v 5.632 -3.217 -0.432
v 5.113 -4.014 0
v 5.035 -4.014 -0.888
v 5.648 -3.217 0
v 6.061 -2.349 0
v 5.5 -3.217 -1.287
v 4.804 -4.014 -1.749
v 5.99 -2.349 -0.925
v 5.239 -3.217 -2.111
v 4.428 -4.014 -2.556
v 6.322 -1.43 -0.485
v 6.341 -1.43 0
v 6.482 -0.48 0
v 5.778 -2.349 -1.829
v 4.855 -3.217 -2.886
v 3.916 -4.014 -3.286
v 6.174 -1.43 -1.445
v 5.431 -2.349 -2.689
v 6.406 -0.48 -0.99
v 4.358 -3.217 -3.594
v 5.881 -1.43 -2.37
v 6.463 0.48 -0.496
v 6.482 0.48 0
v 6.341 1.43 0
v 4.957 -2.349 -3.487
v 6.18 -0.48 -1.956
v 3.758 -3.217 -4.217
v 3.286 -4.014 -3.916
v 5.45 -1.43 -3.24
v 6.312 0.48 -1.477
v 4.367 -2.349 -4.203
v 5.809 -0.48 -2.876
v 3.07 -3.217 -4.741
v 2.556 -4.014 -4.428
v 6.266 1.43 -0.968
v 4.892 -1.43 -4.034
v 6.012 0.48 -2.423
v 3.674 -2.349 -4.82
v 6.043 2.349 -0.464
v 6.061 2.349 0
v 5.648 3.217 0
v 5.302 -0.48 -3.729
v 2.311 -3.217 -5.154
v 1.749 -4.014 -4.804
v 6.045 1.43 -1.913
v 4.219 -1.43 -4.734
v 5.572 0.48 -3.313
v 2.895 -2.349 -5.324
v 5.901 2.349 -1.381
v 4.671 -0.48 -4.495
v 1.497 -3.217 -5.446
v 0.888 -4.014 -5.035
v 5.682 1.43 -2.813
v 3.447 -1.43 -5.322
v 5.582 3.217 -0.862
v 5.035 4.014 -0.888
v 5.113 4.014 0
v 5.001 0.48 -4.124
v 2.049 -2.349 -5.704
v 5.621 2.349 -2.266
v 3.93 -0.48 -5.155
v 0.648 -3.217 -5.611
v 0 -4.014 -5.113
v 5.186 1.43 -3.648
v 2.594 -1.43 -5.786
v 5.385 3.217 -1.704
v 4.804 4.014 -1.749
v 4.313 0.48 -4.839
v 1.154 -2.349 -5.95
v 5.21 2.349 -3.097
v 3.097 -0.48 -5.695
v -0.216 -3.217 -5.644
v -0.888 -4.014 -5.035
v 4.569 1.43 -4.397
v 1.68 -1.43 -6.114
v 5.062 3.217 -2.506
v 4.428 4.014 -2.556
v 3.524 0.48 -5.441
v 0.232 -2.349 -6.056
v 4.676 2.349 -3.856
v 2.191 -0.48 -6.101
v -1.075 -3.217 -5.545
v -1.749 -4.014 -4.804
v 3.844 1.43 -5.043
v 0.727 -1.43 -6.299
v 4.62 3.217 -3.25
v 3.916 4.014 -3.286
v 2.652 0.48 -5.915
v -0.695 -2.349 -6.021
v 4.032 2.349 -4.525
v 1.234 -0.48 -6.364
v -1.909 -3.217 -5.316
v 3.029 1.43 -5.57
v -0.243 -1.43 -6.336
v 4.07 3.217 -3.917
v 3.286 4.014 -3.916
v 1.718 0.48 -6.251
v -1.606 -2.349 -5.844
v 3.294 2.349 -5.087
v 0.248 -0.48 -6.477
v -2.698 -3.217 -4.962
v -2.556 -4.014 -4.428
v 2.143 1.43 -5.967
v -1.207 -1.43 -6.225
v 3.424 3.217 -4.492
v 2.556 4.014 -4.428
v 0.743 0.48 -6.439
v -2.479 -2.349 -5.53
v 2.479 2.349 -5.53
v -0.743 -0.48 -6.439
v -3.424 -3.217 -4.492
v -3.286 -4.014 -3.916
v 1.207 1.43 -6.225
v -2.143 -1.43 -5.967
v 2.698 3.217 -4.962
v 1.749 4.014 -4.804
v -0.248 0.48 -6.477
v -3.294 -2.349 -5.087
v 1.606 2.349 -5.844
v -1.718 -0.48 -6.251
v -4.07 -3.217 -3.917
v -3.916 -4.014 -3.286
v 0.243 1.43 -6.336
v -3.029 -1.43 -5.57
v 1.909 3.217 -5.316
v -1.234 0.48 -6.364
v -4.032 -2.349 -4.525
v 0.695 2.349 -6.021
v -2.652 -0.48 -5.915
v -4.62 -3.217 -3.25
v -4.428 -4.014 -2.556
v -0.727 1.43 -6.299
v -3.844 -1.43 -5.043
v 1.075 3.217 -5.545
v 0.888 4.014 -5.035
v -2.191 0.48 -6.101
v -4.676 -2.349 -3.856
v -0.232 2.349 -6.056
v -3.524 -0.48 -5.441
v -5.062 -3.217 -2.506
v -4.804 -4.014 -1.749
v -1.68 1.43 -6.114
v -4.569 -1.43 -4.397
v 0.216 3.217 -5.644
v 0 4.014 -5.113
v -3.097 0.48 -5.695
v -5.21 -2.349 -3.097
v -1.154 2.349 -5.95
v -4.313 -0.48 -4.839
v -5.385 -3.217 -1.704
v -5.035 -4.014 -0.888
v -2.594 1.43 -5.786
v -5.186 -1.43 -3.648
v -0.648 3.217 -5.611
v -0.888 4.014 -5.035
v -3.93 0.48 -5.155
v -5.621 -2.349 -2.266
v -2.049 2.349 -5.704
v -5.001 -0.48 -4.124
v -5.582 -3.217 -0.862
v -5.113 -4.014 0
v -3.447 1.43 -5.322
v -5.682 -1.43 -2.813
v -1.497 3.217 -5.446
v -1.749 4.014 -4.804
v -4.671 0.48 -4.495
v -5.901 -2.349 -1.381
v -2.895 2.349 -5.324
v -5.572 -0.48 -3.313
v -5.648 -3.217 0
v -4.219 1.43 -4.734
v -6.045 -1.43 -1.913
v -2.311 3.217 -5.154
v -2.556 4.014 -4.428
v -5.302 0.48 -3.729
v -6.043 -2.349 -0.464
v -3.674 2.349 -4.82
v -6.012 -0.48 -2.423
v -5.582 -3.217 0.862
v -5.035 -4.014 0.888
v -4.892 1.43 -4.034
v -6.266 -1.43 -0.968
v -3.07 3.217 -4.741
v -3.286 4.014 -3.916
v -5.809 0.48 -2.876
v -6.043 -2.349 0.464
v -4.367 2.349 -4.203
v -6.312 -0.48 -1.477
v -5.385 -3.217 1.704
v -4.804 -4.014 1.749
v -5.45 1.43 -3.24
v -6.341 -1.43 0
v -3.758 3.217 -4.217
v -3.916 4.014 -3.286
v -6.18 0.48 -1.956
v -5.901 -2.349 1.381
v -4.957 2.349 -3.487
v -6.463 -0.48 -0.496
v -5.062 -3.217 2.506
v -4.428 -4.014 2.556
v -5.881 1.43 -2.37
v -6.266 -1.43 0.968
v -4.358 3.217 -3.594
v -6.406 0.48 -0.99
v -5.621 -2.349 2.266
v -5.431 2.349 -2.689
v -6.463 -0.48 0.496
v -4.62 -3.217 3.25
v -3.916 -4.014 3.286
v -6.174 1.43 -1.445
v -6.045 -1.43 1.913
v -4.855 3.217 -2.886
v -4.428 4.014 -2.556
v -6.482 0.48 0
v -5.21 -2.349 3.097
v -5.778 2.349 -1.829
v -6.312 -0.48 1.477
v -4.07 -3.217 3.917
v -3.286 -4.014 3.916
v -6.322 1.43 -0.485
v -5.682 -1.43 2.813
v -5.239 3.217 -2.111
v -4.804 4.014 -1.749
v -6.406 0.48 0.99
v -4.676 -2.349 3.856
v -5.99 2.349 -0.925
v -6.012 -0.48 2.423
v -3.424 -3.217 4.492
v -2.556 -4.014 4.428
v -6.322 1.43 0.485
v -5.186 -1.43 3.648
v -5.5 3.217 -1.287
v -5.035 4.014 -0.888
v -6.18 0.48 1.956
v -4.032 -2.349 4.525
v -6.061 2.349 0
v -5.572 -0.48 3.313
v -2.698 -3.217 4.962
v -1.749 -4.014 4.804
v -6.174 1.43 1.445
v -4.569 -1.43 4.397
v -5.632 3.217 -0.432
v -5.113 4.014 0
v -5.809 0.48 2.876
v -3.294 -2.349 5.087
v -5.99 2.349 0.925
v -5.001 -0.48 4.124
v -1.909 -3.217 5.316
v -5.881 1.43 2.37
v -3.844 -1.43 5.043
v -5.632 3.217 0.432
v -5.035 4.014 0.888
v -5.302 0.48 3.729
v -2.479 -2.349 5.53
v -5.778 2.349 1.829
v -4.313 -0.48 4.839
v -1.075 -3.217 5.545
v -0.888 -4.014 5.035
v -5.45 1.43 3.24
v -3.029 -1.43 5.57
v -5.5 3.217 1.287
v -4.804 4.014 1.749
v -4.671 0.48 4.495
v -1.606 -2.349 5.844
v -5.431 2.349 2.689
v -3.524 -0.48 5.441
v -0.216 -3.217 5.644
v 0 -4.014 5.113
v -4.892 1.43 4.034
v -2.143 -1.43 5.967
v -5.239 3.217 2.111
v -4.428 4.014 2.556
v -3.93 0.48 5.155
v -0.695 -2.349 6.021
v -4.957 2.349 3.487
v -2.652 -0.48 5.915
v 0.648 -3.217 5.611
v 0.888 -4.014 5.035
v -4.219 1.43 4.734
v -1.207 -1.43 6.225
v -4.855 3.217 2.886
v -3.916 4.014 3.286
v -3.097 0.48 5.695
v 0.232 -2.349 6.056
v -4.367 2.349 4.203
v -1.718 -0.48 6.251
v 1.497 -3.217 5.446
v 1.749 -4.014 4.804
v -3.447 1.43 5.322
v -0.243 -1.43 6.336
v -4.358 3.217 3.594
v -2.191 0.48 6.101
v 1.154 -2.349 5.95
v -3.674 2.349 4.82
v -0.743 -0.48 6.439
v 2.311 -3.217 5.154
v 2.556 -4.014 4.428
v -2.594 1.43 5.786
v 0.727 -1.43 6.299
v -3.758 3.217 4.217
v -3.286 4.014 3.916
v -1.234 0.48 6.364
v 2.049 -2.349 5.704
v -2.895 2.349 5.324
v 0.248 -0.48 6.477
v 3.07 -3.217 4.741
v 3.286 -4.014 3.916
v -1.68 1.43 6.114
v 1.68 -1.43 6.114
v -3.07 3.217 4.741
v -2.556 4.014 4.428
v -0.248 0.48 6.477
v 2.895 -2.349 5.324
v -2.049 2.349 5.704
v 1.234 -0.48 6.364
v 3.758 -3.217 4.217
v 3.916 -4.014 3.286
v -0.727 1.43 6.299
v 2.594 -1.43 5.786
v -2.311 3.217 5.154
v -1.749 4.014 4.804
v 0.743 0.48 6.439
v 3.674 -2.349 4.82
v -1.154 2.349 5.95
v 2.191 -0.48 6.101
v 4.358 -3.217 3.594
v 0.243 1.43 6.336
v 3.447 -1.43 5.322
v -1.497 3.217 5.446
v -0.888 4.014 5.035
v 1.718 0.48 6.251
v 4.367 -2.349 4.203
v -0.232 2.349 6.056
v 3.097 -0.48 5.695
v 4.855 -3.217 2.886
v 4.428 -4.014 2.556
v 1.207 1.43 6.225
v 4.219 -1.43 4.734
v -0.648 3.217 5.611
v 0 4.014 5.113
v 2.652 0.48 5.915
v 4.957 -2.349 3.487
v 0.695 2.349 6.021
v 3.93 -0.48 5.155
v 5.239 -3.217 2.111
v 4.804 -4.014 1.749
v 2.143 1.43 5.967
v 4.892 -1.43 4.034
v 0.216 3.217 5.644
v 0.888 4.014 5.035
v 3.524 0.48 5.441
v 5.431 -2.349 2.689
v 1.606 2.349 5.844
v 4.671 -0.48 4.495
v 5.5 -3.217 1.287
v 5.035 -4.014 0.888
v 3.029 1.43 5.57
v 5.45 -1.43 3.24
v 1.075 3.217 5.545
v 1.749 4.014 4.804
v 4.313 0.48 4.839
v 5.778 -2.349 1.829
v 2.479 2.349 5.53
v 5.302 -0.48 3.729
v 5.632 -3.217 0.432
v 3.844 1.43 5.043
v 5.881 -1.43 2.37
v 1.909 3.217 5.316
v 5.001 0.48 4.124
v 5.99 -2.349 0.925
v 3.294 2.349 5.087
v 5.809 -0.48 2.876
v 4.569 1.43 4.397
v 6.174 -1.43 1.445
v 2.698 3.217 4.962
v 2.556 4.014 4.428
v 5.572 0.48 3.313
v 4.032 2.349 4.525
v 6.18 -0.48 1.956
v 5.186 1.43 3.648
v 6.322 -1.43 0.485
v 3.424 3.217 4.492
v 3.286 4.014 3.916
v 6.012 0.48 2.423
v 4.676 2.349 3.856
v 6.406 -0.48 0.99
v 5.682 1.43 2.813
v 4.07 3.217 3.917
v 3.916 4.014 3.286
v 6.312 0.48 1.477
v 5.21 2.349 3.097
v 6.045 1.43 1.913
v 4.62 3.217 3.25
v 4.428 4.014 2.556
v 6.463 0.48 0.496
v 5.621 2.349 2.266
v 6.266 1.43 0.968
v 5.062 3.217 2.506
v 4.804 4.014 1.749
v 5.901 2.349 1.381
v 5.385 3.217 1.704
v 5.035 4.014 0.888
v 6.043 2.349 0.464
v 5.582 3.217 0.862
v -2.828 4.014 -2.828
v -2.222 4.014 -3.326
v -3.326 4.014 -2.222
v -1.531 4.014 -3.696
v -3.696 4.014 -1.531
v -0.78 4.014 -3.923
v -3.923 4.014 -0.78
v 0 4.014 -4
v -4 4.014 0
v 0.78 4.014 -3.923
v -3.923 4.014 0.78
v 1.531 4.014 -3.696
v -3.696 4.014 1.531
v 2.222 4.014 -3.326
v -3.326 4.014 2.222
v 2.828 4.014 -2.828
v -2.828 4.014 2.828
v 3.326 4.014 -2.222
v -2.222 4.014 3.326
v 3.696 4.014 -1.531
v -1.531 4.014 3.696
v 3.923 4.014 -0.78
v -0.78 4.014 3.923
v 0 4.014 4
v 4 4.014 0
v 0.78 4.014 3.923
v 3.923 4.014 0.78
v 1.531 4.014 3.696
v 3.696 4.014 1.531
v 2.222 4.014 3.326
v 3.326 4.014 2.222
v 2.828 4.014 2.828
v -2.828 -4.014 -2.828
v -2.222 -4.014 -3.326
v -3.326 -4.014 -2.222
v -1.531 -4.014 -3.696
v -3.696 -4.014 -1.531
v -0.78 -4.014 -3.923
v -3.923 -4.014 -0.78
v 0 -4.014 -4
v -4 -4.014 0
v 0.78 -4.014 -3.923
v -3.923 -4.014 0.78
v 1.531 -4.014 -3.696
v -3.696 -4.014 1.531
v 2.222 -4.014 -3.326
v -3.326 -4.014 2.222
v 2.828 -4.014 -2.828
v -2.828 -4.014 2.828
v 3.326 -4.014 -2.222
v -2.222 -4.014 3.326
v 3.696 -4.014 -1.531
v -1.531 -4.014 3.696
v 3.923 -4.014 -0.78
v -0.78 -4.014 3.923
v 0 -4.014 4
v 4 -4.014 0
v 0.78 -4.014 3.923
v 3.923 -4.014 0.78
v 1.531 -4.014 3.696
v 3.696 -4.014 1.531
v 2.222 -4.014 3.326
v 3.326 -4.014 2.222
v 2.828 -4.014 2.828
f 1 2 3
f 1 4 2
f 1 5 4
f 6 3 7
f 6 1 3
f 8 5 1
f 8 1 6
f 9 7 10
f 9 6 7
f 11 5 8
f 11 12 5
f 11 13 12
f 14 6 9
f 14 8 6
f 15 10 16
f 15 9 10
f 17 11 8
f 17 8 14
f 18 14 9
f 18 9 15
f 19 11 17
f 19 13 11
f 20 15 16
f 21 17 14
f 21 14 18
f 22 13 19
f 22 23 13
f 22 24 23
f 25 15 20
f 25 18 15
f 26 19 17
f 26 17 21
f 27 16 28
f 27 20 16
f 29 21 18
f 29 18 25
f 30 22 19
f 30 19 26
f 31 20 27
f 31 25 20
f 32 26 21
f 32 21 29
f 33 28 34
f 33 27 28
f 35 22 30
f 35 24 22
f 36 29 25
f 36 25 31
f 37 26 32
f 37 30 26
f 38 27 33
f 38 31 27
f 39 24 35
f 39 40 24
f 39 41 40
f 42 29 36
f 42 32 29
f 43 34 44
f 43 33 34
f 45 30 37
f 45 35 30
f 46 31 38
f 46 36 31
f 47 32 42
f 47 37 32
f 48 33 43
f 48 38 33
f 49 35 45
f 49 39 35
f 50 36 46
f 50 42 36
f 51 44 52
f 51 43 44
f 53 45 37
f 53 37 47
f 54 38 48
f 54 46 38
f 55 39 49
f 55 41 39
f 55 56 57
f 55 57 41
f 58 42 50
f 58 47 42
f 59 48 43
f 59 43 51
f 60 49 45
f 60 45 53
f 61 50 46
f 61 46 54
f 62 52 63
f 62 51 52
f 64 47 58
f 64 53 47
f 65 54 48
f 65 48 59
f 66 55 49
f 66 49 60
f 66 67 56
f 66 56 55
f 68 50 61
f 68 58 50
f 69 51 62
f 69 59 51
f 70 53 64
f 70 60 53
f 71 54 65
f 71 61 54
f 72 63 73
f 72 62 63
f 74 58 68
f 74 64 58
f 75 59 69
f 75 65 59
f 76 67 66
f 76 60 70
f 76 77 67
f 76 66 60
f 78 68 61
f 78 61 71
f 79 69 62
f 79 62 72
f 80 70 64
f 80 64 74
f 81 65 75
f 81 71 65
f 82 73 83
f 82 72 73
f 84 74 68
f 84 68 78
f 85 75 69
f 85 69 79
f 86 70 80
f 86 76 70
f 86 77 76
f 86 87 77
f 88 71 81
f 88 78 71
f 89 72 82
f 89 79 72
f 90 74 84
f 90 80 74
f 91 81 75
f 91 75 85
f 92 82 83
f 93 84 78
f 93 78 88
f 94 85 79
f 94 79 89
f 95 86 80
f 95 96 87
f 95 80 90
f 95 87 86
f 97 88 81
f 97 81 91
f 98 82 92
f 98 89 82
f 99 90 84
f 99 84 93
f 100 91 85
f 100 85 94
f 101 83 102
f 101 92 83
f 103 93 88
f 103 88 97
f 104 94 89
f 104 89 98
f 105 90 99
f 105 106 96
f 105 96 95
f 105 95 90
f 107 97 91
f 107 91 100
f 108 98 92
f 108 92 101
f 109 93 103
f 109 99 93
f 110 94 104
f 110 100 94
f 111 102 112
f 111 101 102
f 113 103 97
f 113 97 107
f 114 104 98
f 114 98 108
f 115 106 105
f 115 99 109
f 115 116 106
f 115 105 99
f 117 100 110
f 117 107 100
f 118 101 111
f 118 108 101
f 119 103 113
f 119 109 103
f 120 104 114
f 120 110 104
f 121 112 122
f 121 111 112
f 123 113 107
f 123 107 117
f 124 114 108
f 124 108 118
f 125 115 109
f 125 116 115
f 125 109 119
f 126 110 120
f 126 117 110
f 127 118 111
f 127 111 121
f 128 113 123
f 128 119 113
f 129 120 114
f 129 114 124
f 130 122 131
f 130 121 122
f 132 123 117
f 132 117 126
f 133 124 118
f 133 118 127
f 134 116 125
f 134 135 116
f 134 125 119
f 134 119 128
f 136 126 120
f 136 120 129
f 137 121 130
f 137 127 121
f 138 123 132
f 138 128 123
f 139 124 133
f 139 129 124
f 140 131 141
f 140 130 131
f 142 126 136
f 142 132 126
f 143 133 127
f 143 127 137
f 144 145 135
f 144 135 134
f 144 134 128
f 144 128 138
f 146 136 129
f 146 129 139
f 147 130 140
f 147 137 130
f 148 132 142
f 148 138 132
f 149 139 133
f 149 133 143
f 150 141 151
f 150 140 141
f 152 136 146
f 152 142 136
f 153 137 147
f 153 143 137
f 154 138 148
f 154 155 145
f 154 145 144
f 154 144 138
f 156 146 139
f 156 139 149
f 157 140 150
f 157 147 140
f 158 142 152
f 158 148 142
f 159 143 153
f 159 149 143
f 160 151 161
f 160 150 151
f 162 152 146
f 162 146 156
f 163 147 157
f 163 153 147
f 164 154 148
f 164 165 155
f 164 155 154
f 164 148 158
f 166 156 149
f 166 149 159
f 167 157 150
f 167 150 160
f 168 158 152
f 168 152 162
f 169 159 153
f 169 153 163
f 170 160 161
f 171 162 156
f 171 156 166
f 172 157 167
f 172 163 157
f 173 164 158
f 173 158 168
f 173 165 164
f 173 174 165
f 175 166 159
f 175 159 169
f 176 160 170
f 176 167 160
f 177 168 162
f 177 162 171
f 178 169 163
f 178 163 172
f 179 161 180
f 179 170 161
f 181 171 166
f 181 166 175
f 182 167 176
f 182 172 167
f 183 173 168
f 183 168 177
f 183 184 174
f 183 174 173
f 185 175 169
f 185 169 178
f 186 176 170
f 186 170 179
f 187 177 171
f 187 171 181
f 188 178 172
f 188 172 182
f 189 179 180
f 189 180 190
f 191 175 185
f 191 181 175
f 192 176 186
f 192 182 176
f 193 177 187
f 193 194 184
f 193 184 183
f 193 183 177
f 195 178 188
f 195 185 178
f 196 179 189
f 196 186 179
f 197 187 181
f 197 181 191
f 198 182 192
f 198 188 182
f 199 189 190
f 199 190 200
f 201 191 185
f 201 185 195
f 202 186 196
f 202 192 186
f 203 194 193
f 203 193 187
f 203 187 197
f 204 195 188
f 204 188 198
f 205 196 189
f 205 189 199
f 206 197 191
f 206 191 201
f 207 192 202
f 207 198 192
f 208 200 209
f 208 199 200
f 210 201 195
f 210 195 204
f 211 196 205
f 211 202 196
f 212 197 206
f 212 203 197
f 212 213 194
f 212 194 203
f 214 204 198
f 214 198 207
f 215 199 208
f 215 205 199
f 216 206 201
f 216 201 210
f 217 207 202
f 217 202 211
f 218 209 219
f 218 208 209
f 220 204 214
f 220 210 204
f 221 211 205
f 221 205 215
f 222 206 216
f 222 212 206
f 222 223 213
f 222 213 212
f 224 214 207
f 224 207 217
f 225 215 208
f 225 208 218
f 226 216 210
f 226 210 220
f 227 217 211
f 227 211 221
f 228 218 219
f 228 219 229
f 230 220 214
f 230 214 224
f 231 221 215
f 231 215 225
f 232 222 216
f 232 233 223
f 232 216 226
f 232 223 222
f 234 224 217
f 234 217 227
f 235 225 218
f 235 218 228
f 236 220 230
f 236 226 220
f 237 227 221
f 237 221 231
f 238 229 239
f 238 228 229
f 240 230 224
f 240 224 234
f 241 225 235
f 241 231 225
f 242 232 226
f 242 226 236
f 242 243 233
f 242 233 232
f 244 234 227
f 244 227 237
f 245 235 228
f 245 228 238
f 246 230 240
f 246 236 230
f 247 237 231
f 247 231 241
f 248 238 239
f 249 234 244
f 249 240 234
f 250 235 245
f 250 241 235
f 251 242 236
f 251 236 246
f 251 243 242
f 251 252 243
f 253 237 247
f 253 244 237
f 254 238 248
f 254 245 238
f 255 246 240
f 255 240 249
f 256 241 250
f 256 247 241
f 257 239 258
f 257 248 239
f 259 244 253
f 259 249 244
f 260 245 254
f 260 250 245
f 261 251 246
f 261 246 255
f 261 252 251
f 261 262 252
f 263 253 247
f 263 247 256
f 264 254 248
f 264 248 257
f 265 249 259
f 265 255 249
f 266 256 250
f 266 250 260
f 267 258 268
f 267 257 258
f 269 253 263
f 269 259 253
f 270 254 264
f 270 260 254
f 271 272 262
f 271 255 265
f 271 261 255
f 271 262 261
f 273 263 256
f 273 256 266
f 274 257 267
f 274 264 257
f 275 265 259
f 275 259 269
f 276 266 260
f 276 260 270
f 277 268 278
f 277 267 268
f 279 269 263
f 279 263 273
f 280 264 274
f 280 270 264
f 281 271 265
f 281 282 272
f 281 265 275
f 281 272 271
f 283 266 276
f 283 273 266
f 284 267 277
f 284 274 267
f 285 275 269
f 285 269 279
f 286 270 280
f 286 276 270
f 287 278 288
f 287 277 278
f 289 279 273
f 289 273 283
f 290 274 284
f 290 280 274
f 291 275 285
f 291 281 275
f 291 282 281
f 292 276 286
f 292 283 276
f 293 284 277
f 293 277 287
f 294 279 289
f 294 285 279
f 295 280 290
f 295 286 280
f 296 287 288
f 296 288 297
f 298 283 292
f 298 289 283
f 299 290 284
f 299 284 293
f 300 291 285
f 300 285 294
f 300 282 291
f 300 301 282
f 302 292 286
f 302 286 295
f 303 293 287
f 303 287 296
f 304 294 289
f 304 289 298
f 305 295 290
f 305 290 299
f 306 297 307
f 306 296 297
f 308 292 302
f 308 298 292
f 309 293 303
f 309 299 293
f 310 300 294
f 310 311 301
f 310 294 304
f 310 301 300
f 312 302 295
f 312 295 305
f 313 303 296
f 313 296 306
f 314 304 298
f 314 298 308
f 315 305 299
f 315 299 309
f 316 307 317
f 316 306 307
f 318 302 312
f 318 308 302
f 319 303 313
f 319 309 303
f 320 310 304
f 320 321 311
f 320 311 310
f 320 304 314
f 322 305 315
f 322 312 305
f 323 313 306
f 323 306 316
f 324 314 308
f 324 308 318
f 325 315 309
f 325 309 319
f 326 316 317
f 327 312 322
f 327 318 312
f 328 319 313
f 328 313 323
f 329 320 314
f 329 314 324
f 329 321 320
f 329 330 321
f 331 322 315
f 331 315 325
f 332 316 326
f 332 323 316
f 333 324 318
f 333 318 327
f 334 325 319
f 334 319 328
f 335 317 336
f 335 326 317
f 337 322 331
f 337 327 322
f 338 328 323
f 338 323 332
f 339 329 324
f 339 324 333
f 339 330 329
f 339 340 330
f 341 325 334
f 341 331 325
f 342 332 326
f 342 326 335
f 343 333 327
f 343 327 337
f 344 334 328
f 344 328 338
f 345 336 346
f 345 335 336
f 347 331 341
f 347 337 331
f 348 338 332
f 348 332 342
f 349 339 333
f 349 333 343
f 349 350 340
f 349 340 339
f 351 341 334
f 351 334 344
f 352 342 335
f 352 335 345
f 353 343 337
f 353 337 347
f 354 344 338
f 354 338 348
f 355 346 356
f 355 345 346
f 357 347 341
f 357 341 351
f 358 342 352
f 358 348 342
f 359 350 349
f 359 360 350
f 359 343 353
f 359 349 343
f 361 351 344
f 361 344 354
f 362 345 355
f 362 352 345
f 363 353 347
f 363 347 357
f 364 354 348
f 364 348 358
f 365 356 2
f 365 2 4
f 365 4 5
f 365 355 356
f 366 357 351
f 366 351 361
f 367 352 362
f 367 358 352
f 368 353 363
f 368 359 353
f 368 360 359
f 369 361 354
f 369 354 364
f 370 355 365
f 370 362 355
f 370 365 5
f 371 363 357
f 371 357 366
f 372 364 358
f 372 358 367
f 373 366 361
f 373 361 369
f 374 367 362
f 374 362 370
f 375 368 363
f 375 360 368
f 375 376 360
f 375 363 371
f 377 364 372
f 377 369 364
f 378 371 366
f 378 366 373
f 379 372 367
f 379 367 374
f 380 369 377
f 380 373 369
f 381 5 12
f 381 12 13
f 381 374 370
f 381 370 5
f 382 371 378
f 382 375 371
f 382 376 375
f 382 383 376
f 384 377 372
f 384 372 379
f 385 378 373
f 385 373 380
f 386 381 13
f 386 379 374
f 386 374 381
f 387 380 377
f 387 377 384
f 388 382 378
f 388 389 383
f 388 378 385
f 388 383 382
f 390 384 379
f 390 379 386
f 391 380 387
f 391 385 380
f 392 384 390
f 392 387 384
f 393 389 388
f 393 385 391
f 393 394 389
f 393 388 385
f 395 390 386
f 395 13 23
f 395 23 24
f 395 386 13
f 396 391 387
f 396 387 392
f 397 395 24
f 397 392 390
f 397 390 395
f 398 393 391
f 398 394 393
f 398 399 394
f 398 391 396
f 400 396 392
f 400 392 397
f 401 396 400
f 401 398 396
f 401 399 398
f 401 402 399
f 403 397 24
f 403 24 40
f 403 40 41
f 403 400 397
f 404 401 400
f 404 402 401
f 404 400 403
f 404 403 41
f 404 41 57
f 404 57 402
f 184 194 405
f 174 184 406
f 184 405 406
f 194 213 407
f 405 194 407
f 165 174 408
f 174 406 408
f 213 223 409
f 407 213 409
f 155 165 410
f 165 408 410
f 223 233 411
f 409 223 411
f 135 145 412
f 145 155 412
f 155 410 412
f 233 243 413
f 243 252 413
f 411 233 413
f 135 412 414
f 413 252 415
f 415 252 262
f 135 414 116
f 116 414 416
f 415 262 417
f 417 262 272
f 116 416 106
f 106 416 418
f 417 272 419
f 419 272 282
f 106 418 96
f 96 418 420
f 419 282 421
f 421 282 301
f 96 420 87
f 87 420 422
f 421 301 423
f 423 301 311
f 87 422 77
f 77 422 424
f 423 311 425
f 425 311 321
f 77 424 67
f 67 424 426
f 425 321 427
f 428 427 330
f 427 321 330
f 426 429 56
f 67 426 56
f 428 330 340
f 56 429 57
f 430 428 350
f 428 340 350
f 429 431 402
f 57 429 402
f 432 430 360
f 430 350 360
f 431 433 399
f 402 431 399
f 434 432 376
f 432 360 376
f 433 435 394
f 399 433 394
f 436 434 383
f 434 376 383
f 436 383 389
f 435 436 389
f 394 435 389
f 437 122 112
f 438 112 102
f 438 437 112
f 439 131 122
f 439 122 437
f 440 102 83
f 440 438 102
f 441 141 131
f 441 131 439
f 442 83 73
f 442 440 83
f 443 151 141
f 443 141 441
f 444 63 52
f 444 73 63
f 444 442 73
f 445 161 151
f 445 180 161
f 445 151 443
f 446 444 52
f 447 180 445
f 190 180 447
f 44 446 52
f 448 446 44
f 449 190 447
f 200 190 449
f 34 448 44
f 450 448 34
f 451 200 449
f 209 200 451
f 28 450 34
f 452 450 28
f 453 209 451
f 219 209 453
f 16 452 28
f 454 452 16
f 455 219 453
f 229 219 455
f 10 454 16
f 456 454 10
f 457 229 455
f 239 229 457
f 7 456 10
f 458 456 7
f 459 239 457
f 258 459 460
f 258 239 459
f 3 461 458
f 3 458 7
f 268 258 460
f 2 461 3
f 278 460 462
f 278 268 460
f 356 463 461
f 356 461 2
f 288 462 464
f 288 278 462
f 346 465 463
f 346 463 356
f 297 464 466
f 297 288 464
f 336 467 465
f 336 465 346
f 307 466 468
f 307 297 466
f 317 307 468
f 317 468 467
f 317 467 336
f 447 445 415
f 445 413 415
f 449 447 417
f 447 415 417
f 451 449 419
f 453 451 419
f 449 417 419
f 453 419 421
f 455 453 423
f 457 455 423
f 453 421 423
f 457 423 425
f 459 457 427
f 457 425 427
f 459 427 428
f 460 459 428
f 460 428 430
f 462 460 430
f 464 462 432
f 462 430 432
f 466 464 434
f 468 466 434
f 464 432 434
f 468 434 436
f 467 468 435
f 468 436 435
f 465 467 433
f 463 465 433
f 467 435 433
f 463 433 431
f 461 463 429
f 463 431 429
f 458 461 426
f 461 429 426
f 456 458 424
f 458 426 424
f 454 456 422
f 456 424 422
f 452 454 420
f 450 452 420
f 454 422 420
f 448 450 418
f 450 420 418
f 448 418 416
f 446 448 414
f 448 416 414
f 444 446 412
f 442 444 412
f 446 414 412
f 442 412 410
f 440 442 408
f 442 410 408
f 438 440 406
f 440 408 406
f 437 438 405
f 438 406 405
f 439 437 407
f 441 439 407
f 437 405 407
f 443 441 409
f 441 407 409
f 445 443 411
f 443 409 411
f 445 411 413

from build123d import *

# Parameters (mm, degrees)
SKETCH2_R           = 4
CUT_EXTRUDE1_DEPTH  = 9.5
SKETCH3_OUTSIDE_W   = 19.21
SKETCH3_OUTSIDE_H   = 16.456
SKETCH3_OUTSIDE_W_2 = 16.89881261
SKETCH3_OUTSIDE_H_2 = 8.027852412
CUT_EXTRUDE2_DEPTH  = 9.5


with BuildPart() as part:
    # Sketch1 → Revolve4 (revolve)
    with BuildSketch(Plane.XY):
        with BuildLine():
            Line((0, 6.5), (0, -6.5))
            ThreePointArc((0, -6.5), (6.5, 0), (0, 6.5))
        make_face()
    revolve(axis=Axis((0, 0, 0), (0, 1, 0)))

    # Sketch2 → Cut-Extrude1 (cut, symmetric)
    with BuildSketch(Plane(origin=(0, 0, 0), x_dir=(1, 0, 0), z_dir=(0, 1, 0))):
        with Locations(Location((0, 0, 0), (0, 0, 180))):
            Circle(SKETCH2_R)
    extrude(amount=CUT_EXTRUDE1_DEPTH, both=True, mode=Mode.SUBTRACT)

    # Sketch3 outside → Cut-Extrude2 (cut, symmetric)
    with BuildSketch(Plane.XY):
        Rectangle(SKETCH3_OUTSIDE_W, SKETCH3_OUTSIDE_H)
        Rectangle(SKETCH3_OUTSIDE_W_2, SKETCH3_OUTSIDE_H_2, mode=Mode.SUBTRACT)
    extrude(amount=CUT_EXTRUDE2_DEPTH, both=True, mode=Mode.SUBTRACT)


solid = part.part
